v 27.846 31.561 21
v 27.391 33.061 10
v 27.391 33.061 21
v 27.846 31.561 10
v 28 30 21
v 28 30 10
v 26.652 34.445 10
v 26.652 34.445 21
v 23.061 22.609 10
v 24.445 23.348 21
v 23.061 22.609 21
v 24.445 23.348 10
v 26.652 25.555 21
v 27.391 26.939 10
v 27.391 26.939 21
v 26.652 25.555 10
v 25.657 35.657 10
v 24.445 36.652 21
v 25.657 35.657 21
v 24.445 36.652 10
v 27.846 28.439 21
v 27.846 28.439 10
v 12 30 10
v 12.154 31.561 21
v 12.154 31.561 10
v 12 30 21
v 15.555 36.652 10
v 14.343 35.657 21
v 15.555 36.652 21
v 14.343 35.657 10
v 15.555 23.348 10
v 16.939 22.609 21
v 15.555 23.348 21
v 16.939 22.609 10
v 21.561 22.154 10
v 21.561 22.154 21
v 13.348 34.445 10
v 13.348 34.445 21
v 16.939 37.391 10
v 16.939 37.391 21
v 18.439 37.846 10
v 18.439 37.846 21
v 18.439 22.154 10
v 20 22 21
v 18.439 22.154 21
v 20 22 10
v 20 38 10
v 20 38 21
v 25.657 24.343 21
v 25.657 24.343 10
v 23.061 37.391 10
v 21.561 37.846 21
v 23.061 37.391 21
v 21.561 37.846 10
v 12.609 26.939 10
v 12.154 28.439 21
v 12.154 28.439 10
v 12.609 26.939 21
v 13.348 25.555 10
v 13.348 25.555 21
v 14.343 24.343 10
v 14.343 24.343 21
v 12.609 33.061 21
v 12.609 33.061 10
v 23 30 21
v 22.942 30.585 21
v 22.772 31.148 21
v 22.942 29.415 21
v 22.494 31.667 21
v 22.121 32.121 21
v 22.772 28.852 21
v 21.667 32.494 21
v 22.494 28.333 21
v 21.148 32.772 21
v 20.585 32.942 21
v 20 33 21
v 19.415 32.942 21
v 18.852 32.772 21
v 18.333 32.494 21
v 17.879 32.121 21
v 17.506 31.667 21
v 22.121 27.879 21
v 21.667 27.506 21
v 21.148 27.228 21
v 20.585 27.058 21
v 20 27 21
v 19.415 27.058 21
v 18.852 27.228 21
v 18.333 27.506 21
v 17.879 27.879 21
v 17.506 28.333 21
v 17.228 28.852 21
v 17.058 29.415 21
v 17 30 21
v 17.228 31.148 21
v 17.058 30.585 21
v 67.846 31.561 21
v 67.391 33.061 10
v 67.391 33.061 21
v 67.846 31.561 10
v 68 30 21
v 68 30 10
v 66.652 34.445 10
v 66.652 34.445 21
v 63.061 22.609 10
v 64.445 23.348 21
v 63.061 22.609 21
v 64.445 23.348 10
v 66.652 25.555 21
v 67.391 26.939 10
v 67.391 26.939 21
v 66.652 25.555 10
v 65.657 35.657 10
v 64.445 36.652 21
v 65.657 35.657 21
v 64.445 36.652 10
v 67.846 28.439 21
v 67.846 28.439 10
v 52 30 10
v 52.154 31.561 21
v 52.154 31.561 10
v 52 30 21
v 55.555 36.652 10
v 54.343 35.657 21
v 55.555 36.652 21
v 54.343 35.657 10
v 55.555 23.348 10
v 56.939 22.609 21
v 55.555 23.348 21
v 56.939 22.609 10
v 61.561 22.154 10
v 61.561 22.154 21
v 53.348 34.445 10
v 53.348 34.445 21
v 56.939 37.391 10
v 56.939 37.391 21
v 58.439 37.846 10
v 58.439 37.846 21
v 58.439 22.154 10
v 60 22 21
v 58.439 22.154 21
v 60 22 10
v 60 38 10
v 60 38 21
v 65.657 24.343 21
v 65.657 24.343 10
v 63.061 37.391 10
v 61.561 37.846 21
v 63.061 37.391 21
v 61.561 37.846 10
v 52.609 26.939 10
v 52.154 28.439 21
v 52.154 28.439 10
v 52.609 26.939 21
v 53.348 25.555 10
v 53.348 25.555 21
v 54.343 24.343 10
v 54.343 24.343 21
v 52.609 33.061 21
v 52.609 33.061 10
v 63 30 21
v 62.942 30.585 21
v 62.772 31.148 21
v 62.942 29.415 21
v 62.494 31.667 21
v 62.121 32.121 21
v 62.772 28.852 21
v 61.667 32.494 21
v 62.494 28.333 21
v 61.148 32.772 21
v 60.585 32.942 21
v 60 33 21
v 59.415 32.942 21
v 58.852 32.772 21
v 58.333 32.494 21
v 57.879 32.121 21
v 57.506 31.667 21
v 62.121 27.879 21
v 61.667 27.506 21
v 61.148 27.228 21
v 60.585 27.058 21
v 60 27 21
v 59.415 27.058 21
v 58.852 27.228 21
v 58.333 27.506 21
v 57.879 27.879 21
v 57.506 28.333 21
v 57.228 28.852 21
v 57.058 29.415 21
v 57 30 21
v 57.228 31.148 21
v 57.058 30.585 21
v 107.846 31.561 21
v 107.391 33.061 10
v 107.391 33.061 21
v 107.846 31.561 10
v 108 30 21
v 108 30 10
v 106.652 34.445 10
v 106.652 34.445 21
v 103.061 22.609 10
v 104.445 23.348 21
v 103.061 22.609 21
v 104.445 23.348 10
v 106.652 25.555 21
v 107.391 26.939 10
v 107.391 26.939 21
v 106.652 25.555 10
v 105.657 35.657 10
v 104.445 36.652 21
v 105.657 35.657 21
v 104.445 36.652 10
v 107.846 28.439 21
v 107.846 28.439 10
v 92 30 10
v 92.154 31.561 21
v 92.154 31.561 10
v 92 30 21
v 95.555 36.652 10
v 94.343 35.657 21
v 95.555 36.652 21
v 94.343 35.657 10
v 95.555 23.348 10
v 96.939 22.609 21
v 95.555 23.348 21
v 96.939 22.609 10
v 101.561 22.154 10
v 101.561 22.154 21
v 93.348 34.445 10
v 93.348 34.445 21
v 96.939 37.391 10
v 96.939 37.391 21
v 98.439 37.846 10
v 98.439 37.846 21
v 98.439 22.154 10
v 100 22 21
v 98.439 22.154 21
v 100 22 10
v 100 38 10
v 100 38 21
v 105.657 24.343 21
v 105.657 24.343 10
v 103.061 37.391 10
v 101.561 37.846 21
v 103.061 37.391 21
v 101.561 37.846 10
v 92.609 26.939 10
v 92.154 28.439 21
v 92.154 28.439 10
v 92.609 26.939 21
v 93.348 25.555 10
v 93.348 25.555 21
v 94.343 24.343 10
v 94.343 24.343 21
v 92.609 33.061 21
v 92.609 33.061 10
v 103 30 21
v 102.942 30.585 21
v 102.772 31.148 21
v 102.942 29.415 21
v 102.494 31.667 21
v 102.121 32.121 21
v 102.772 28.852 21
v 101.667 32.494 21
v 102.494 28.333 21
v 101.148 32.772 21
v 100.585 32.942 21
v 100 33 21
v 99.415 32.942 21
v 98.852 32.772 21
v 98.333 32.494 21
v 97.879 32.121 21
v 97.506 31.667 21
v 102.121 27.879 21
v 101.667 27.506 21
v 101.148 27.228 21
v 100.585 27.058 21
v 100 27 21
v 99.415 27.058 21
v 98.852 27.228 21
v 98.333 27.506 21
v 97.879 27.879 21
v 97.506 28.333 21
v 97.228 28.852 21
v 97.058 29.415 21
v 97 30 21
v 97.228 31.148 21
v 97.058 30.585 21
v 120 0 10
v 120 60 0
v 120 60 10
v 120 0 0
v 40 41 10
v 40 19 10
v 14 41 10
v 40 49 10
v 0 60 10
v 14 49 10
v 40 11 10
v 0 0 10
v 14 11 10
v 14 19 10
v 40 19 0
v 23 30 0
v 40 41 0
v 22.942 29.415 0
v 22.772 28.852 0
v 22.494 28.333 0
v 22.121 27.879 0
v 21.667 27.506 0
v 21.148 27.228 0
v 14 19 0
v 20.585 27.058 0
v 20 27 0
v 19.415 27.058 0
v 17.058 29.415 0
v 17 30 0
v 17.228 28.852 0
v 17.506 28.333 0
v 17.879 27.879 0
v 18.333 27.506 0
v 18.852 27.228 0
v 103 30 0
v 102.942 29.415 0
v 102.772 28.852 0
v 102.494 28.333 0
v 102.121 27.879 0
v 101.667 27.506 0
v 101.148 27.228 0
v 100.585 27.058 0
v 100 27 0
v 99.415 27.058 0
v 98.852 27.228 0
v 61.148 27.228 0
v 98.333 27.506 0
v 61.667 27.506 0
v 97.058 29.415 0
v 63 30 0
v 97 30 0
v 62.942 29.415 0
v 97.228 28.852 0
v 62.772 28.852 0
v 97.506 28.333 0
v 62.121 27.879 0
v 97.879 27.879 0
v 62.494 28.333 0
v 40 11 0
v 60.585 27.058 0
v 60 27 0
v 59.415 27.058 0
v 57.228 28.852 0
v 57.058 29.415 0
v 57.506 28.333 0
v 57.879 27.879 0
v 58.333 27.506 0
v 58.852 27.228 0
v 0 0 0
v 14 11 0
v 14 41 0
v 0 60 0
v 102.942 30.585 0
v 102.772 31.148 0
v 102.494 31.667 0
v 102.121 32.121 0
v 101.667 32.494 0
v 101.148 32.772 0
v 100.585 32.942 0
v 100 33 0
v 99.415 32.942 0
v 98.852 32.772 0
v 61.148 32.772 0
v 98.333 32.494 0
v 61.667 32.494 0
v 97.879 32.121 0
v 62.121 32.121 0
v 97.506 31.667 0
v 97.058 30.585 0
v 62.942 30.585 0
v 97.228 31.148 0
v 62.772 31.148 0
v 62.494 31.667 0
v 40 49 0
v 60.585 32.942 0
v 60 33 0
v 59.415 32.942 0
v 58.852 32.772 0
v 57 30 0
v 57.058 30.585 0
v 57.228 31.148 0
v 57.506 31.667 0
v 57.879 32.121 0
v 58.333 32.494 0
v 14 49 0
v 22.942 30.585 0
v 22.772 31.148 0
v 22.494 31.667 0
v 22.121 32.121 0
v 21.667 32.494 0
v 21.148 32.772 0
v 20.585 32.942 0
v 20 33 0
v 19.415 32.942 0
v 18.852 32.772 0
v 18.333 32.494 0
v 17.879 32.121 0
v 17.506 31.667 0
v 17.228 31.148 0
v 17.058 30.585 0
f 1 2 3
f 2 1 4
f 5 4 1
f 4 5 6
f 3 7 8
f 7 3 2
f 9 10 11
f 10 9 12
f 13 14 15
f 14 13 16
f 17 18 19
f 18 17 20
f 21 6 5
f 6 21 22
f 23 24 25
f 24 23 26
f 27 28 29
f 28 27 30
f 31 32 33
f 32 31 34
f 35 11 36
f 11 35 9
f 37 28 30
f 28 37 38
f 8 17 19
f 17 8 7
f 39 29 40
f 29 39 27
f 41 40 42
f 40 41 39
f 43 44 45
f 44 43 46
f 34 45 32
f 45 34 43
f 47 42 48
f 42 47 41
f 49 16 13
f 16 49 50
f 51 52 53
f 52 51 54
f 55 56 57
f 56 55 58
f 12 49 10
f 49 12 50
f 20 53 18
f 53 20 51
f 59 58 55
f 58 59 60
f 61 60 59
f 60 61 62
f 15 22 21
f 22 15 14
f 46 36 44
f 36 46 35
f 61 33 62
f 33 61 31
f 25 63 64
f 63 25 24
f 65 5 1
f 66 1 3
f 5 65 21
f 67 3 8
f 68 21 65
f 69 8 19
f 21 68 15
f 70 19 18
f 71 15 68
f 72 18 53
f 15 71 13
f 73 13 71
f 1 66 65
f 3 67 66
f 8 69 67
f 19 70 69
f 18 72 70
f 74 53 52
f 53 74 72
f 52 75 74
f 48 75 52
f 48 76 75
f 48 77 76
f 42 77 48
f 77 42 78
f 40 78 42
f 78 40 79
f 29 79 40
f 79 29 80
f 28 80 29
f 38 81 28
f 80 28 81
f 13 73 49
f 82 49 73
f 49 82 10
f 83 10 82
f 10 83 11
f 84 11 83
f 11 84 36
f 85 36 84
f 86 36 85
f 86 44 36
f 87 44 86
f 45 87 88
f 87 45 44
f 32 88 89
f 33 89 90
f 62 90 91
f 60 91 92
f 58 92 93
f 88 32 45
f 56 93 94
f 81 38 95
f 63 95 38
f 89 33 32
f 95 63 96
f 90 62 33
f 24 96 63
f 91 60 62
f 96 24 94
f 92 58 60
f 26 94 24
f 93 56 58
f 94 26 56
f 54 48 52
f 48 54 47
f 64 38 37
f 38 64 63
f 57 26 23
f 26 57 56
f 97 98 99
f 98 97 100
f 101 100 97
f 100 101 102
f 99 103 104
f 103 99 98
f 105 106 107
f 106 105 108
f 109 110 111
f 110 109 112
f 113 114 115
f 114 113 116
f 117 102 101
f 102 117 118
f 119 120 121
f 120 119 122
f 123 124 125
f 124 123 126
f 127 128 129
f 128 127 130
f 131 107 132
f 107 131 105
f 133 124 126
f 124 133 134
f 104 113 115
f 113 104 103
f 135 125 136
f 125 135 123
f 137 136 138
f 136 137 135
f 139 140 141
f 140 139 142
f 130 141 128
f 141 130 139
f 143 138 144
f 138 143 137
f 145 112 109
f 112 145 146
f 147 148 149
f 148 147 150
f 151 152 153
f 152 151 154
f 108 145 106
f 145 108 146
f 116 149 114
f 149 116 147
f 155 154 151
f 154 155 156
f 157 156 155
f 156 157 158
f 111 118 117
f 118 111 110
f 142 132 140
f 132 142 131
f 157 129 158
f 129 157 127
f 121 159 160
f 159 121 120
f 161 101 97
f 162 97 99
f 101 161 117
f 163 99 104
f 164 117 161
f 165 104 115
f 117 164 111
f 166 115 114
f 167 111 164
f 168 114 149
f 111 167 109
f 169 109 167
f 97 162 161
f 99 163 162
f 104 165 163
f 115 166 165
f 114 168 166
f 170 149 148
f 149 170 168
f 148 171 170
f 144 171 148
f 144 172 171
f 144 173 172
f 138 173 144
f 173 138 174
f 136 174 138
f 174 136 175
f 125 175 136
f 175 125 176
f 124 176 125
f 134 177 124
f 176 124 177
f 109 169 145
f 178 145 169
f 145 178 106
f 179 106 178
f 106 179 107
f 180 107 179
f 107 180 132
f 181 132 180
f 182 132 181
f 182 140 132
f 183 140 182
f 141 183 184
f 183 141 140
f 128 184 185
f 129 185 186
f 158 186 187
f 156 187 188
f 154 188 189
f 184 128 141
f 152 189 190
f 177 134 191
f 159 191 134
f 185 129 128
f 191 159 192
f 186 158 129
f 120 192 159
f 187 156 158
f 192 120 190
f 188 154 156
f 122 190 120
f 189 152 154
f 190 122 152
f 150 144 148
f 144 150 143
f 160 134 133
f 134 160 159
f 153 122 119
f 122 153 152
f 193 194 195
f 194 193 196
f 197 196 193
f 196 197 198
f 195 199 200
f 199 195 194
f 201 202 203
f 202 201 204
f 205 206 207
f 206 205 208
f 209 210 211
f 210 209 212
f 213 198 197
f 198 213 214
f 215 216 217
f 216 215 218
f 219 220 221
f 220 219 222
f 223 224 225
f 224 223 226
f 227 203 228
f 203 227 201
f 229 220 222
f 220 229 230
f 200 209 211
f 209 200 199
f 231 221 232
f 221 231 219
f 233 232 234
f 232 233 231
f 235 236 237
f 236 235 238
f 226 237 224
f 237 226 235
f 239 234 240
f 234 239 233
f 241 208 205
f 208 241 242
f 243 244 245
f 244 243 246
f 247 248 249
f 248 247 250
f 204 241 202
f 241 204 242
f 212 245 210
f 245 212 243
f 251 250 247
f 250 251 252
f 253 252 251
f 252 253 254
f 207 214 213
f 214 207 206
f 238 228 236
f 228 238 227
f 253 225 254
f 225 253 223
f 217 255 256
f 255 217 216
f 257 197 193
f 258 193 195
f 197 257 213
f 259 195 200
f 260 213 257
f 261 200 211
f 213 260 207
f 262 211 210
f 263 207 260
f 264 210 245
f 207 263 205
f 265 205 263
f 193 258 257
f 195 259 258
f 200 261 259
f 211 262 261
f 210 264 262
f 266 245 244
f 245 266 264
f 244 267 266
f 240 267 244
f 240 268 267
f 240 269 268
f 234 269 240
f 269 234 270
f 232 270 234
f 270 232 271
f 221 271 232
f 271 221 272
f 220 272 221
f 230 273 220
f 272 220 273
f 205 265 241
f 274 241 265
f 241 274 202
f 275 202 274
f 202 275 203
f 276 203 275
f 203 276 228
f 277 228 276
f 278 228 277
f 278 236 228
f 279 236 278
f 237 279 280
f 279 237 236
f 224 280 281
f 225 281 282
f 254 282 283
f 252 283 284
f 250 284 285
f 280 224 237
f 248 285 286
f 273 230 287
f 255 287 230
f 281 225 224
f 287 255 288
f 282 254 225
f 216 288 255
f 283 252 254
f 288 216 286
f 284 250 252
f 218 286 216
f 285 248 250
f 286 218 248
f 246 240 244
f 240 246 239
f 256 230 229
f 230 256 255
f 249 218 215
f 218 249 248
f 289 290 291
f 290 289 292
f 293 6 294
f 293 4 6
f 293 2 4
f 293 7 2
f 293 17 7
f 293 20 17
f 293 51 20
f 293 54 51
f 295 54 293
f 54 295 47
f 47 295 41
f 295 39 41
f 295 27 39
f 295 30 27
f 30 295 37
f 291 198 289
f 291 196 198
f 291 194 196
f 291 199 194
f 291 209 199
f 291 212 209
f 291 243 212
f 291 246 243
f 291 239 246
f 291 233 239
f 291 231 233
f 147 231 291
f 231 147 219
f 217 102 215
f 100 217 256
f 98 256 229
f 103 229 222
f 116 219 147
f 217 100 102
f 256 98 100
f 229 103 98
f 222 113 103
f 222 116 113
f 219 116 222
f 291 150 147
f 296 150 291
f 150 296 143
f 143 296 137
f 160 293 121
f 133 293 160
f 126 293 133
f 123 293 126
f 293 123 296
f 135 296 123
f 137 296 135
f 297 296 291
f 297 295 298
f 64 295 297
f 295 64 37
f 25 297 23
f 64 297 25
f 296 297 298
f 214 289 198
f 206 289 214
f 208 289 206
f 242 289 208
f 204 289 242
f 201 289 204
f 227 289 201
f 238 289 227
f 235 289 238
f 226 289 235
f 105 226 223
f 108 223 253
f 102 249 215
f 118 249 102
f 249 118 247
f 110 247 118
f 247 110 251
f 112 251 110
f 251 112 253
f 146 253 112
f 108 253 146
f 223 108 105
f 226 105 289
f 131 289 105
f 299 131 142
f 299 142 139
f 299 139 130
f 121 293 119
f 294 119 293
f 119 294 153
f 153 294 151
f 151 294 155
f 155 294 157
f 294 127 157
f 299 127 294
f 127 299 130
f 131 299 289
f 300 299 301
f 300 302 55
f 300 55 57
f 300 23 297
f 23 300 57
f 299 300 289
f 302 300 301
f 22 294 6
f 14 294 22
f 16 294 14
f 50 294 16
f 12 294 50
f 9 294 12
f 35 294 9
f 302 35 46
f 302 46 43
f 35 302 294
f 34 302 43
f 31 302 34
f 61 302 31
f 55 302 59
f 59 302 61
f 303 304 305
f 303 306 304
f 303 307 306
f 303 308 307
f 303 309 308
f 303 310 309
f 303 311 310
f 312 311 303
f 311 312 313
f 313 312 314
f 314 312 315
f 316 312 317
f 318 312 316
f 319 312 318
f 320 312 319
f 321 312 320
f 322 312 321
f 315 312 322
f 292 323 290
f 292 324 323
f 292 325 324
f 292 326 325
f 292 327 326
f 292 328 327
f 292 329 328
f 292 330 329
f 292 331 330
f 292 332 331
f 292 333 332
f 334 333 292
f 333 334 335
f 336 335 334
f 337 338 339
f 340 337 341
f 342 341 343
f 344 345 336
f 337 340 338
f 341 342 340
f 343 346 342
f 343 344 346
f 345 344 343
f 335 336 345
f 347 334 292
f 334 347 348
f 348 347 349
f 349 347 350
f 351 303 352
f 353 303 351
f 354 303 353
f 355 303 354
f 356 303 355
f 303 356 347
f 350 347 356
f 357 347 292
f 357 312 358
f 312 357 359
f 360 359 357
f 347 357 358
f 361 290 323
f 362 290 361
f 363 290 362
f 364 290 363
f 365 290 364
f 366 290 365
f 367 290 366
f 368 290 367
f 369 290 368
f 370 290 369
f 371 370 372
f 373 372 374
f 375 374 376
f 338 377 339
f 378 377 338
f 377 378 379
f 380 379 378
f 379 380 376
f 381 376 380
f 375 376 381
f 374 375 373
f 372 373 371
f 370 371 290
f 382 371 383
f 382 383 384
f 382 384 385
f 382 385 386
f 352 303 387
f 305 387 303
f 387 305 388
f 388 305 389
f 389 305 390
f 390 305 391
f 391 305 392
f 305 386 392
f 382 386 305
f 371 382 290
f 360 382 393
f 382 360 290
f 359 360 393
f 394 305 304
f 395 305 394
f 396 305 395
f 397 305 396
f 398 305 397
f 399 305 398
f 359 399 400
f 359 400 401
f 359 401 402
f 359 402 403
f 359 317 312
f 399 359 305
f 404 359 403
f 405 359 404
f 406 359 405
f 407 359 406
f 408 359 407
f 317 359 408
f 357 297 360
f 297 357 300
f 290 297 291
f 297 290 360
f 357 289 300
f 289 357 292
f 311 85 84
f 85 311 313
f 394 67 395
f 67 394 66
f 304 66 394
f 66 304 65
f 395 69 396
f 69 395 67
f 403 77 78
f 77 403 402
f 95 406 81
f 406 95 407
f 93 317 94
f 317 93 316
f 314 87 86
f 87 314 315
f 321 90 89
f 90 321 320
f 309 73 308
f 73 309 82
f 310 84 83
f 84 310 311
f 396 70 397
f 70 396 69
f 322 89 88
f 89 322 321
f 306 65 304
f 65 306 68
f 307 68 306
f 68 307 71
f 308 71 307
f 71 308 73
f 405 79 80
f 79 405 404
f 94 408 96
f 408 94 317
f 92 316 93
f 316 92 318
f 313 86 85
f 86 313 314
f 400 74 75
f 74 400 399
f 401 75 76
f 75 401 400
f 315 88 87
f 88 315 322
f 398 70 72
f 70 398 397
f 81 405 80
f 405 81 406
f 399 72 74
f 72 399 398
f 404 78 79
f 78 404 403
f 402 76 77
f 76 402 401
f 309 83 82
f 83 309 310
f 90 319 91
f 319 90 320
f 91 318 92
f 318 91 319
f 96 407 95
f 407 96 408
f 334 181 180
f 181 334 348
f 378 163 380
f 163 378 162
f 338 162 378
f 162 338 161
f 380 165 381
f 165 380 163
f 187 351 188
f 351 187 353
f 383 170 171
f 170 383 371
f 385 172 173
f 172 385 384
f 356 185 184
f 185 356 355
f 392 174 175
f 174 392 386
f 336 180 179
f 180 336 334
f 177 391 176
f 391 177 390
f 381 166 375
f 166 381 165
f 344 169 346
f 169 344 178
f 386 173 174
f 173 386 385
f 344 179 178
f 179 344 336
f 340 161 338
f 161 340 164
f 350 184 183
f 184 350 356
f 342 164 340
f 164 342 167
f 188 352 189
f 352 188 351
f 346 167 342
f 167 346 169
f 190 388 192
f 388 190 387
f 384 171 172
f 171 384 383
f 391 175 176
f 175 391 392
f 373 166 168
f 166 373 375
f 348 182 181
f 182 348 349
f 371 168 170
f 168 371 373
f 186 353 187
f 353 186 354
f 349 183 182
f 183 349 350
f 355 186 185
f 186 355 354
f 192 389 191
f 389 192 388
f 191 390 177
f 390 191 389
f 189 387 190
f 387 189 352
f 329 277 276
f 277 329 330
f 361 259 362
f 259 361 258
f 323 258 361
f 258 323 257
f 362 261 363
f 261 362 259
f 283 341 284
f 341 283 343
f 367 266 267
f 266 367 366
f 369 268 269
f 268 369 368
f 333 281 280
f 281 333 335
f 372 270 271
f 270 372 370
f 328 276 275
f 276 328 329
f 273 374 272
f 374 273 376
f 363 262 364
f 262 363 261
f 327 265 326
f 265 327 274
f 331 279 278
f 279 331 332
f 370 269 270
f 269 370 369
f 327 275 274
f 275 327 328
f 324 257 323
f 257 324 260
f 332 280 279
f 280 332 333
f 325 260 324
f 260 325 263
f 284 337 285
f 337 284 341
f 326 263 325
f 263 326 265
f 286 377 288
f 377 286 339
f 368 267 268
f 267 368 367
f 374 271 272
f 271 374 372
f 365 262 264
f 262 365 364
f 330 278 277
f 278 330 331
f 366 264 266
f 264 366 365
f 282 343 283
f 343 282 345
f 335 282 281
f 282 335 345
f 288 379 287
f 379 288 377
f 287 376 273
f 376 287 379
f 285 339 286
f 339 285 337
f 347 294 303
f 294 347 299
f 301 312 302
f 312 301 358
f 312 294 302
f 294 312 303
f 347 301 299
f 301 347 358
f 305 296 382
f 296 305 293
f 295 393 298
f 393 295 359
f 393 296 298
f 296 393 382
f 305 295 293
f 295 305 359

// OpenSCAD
$fn = 32;

// ----------------------------------------------------------------------
// Drill jig: three_boss_slot jig
// ----------------------------------------------------------------------

// --- parameters (mm) ---
plate_l = 120;            // plate length, X
plate_w = 60;             // plate width, Y
plate_t = 10;             // plate thickness
boss_d = 16;              // guide boss diameter
boss_h = 12;              // boss height above the plate
guide_d = 6;              // guide hole diameter
boss_pitch = 40;          // boss pitch
slot_w = 8;               // clamp slot width
slot_l = 26;              // clamp slot length
slot_x = 14;              // slot start X

n_boss = 3;  // guide bosses
boss_x0 = (plate_l - (n_boss - 1) * boss_pitch) / 2;  // first boss X
boss_top = plate_t - 1 + boss_h;  // boss crown height
total_h = boss_top;  // overall height

difference() {
  union() {
  cube([plate_l, plate_w, plate_t]);
  for (i = [0 : n_boss - 1])
    translate([boss_x0 + i * boss_pitch, plate_w / 2, plate_t - 1])
      cylinder(h = boss_h, d = boss_d);
  }
  for (i = [0 : n_boss - 1])
    translate([boss_x0 + i * boss_pitch, plate_w / 2, -1])
      cylinder(h = plate_t + boss_h, d = guide_d);
  for (cy = [plate_w * 0.25, plate_w * 0.75])
    translate([slot_x, cy - slot_w / 2, -1])
      cube([slot_l, slot_w, plate_t + 2]);
}
